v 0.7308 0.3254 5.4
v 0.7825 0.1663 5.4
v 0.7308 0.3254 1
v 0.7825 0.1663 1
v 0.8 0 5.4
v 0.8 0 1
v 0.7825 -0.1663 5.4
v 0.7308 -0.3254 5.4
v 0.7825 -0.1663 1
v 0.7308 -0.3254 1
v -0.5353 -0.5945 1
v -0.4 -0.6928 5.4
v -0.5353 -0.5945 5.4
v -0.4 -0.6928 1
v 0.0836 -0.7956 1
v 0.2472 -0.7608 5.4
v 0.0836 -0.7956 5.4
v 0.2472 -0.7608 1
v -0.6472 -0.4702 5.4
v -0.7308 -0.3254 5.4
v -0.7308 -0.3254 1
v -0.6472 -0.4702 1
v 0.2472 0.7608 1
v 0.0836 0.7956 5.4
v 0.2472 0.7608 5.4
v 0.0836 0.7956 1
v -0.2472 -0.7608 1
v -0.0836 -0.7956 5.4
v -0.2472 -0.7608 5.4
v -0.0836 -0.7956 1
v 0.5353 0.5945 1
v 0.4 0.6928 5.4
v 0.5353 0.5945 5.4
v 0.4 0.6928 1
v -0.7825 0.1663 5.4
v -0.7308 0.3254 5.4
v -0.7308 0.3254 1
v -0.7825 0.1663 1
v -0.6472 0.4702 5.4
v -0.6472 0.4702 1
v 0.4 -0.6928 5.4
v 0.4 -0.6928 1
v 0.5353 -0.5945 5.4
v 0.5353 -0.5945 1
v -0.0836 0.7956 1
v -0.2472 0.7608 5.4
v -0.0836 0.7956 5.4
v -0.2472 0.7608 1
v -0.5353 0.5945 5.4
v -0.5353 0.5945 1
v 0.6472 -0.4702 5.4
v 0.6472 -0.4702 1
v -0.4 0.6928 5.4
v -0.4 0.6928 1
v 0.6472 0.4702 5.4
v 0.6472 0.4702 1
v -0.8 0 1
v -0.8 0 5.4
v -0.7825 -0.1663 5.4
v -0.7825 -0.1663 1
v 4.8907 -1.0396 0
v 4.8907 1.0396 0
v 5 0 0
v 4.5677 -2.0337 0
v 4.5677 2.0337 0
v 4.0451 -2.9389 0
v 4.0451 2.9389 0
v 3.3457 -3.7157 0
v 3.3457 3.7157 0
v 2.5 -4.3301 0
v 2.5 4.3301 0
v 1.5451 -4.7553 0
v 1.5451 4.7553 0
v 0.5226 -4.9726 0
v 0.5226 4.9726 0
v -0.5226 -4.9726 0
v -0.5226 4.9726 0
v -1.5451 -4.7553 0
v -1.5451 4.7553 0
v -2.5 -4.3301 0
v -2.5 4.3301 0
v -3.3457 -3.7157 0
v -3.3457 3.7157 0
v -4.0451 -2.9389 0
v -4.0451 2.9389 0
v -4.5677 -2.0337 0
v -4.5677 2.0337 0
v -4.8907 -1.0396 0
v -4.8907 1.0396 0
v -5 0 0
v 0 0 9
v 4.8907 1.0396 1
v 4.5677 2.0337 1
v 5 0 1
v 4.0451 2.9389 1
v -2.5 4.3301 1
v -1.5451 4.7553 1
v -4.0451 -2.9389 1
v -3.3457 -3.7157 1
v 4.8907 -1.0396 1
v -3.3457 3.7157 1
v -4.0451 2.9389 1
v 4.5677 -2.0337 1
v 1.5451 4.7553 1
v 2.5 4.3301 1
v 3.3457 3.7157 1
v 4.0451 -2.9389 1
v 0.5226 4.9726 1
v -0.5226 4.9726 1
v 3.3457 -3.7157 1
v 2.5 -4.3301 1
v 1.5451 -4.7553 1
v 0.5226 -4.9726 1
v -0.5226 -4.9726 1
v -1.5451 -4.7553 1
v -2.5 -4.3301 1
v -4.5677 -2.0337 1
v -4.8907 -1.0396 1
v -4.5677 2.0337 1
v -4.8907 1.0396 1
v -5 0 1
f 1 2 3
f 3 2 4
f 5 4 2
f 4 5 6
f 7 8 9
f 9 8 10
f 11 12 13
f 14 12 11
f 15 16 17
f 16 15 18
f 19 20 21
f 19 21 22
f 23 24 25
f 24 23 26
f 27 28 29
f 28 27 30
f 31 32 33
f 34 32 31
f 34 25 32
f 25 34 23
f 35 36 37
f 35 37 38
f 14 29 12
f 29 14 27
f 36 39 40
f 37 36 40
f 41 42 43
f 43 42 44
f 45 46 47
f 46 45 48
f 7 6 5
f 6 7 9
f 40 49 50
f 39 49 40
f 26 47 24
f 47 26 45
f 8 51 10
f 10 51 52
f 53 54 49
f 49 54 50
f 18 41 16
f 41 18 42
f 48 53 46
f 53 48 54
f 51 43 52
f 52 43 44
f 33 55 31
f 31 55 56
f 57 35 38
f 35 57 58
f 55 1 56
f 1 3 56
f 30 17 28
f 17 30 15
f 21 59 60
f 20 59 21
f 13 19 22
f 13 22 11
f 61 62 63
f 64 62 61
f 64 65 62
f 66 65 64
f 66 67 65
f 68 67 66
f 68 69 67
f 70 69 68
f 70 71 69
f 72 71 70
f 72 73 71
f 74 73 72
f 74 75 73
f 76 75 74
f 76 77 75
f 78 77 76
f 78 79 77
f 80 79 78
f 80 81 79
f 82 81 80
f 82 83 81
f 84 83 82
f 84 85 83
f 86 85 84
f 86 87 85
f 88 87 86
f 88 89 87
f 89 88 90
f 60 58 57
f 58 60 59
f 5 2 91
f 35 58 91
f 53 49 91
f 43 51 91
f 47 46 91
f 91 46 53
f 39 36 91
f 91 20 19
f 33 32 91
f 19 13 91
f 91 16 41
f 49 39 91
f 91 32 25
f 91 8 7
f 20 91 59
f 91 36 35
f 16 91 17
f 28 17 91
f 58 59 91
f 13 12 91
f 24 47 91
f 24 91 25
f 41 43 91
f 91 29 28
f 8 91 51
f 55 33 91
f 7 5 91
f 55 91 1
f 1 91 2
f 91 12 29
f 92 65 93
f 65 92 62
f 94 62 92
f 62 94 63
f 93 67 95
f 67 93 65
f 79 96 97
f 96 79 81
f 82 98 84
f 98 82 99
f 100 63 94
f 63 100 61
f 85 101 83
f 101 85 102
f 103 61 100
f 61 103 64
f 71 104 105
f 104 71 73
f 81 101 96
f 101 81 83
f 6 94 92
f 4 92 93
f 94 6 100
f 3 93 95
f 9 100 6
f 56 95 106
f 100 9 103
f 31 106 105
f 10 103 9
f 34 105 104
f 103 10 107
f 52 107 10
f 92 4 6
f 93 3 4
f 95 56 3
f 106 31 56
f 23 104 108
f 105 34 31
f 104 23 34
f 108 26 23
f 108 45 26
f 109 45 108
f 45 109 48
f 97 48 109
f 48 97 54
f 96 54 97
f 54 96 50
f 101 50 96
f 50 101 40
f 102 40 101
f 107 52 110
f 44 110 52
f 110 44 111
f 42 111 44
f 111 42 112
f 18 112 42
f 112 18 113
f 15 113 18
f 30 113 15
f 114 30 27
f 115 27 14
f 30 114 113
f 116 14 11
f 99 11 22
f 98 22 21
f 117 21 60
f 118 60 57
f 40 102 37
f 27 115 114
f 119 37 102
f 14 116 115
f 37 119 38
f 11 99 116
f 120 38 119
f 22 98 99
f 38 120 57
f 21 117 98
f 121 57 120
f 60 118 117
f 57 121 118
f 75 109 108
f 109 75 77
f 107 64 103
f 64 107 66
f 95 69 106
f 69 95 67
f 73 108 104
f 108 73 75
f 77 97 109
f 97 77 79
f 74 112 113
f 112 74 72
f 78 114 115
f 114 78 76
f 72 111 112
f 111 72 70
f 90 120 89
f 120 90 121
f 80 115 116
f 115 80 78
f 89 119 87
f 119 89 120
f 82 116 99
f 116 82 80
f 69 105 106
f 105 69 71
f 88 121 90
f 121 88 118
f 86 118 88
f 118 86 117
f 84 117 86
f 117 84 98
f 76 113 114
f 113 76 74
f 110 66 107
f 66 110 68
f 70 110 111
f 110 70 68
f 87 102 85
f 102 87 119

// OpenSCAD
$fn=30;
head_radius=5;
head_thick=1;
pin_length=9;
pin_radius=0.8;
pin_base=2;
cylinder(r=head_radius,h=head_thick);
intersection(){
  cylinder(r=pin_radius,h=pin_length);
  cylinder(r1=pin_base,r2=0,h=pin_length);
}
